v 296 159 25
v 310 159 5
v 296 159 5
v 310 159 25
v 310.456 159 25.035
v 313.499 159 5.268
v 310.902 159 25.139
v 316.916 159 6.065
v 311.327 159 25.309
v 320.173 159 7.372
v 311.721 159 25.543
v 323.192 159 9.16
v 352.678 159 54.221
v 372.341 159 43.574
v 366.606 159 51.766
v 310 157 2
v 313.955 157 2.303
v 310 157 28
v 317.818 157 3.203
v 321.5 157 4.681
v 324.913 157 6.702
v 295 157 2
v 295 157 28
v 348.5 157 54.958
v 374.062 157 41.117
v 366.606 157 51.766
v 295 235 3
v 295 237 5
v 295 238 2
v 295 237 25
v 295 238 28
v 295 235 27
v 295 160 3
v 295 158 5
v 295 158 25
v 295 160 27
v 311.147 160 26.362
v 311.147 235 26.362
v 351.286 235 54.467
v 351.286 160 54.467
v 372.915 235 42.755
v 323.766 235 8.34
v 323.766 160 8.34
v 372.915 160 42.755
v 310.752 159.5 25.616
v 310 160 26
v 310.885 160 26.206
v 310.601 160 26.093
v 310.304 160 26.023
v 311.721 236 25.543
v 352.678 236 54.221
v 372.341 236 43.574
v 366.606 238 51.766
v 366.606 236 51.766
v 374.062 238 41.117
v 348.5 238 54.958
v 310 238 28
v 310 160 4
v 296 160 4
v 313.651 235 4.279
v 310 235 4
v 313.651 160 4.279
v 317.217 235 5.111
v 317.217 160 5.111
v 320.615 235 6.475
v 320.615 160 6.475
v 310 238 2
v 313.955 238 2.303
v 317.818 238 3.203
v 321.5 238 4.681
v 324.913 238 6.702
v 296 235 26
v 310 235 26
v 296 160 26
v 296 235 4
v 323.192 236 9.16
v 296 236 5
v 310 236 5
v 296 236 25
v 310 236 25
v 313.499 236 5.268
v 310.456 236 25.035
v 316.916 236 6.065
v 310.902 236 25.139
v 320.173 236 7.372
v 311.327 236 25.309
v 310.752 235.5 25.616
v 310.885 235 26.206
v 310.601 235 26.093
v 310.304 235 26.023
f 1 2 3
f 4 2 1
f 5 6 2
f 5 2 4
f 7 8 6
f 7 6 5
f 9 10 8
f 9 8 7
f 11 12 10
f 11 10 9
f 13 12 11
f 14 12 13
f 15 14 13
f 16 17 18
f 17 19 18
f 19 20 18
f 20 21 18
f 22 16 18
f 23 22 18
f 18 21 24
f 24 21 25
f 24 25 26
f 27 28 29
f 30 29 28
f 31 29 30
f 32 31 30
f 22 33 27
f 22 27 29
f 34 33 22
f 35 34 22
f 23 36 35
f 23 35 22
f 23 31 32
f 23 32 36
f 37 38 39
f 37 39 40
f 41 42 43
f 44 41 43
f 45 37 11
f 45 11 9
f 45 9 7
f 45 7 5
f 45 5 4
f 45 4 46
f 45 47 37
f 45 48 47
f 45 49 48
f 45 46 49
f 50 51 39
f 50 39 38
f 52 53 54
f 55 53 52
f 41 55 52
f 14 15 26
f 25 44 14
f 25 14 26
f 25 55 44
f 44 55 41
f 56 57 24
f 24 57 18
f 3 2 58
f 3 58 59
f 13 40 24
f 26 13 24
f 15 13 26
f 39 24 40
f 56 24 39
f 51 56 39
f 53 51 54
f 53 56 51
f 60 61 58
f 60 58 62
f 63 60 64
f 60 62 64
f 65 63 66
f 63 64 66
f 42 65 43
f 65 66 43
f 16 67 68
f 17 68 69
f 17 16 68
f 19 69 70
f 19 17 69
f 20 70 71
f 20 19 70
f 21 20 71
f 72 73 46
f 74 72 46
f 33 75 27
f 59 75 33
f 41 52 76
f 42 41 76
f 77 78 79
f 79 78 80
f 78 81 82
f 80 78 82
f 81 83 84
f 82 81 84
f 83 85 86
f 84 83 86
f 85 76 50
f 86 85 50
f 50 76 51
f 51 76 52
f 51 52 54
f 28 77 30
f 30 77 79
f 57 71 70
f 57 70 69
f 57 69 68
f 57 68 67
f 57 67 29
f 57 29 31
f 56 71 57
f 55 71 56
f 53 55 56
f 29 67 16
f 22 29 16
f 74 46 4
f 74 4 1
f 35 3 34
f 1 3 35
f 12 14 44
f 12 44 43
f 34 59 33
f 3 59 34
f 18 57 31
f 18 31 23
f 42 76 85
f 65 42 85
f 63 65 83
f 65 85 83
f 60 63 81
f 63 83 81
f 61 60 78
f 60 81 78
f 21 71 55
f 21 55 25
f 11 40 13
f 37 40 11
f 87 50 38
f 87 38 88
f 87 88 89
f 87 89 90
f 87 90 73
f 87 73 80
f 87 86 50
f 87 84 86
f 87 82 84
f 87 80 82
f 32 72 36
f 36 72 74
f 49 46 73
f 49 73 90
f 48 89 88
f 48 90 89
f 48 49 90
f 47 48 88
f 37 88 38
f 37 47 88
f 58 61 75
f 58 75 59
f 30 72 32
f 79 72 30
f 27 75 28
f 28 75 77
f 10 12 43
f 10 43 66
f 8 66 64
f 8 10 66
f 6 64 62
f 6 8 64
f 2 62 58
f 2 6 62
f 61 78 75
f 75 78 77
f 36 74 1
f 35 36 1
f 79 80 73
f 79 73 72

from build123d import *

# Parameters (mm, degrees)
SKETCH019_W             = 81
SKETCH019_H             = 26
SKETCH019_W_2           = 77
SKETCH019_H_2           = 22
REVOLUTION_ANGLE        = 35
SKETCH020_W             = 81
SKETCH020_H             = 26
SKETCH020_W_2           = 77
SKETCH020_H_2           = 22
PAD010_DEPTH            = 60
POCKET006_DEPTH         = 81.001
SKETCH022_W             = 81
SKETCH022_H             = 26
SKETCH022_W_2           = 77
SKETCH022_H_2           = 22
PAD011_DEPTH            = 15
CHAMFER002_SIZE         = 1
BODY005_PLACEMENT_ANGLE = 180


with BuildPart() as part:
    # Sketch019 → Revolution (revolve)
    with BuildSketch(Plane(origin=(310, 157, 2), x_dir=(0, 1, 0), z_dir=(1, 0, 0))):
        with Locations((40.5, 13)):
            Rectangle(SKETCH019_W, SKETCH019_H)
        with Locations((40.5, 13)):
            Rectangle(SKETCH019_W_2, SKETCH019_H_2, mode=Mode.SUBTRACT)
    revolve(axis=Axis((310, 157, 2), (0, 1, 0)), revolution_arc=REVOLUTION_ANGLE)

    # Sketch020 (on Face9 of Revolution) → Pad010 (new body)
    with BuildSketch(Plane(origin=(207.07343, 0, -144.994376), x_dir=(0, 1, 0), z_dir=(0.819152, 0, -0.573576))):
        with Locations((197.5, 192.446999)):
            Rectangle(SKETCH020_W, SKETCH020_H)
        with Locations((197.5, 192.446999)):
            Rectangle(SKETCH020_W_2, SKETCH020_H_2, mode=Mode.SUBTRACT)
    extrude(amount=PAD010_DEPTH)

    # Sketch021 (on Face11 of Pad010) → Pocket006 (cut, through all)
    with BuildSketch(Plane(origin=(0, 157, 0), x_dir=(0, 0, -1), z_dir=(0, -1, 0))):
        Polygon((21.76561, 366.605616), (32.414586, 359.149123), (24.958093, 348.500146), align=None)
    extrude(amount=-POCKET006_DEPTH, mode=Mode.SUBTRACT)

    # Sketch022 (on Face4 of Pocket006) → Pad011 (join)
    with BuildSketch(Plane(origin=(310, 0, 0), x_dir=(0, 1, 0), z_dir=(-1, 0, 0))):
        with Locations((197.5, -15)):
            Rectangle(SKETCH022_W, SKETCH022_H)
        with Locations((197.5, -15)):
            Rectangle(SKETCH022_W_2, SKETCH022_H_2, mode=Mode.SUBTRACT)
    extrude(amount=PAD011_DEPTH)

    # Chamfer002
    chamfer002_edges = [part.edges().sort_by_distance(p)[0] for p in [
        (302.5, 159, 4),
        (295, 197.5, 4),
        (295, 159, 15),
        (302.5, 159, 26),
        (295, 197.5, 26),
        (295, 236, 15),
        (302.5, 236, 26),
        (317.216939, 236, 24.889207),
        (317.216939, 159, 24.889207),
        (310.601412, 159, 3.907434),
        (331.216378, 159, -10.414319),
        (310.601412, 236, 3.907434),
        (331.216378, 236, -10.414319),
        (348.340396, 236, 4.452356),
        (348.340396, 159, 4.452356),
    ]]
    chamfer(chamfer002_edges, length=CHAMFER002_SIZE)


with BuildPart() as part_1:
    # Body005 placement: moved
    add(part.part.moved(Location((0, 395, 30))).rotate(Axis((0, 395, 30), (1, 0, 0)), BODY005_PLACEMENT_ANGLE))


solid = part_1.part
